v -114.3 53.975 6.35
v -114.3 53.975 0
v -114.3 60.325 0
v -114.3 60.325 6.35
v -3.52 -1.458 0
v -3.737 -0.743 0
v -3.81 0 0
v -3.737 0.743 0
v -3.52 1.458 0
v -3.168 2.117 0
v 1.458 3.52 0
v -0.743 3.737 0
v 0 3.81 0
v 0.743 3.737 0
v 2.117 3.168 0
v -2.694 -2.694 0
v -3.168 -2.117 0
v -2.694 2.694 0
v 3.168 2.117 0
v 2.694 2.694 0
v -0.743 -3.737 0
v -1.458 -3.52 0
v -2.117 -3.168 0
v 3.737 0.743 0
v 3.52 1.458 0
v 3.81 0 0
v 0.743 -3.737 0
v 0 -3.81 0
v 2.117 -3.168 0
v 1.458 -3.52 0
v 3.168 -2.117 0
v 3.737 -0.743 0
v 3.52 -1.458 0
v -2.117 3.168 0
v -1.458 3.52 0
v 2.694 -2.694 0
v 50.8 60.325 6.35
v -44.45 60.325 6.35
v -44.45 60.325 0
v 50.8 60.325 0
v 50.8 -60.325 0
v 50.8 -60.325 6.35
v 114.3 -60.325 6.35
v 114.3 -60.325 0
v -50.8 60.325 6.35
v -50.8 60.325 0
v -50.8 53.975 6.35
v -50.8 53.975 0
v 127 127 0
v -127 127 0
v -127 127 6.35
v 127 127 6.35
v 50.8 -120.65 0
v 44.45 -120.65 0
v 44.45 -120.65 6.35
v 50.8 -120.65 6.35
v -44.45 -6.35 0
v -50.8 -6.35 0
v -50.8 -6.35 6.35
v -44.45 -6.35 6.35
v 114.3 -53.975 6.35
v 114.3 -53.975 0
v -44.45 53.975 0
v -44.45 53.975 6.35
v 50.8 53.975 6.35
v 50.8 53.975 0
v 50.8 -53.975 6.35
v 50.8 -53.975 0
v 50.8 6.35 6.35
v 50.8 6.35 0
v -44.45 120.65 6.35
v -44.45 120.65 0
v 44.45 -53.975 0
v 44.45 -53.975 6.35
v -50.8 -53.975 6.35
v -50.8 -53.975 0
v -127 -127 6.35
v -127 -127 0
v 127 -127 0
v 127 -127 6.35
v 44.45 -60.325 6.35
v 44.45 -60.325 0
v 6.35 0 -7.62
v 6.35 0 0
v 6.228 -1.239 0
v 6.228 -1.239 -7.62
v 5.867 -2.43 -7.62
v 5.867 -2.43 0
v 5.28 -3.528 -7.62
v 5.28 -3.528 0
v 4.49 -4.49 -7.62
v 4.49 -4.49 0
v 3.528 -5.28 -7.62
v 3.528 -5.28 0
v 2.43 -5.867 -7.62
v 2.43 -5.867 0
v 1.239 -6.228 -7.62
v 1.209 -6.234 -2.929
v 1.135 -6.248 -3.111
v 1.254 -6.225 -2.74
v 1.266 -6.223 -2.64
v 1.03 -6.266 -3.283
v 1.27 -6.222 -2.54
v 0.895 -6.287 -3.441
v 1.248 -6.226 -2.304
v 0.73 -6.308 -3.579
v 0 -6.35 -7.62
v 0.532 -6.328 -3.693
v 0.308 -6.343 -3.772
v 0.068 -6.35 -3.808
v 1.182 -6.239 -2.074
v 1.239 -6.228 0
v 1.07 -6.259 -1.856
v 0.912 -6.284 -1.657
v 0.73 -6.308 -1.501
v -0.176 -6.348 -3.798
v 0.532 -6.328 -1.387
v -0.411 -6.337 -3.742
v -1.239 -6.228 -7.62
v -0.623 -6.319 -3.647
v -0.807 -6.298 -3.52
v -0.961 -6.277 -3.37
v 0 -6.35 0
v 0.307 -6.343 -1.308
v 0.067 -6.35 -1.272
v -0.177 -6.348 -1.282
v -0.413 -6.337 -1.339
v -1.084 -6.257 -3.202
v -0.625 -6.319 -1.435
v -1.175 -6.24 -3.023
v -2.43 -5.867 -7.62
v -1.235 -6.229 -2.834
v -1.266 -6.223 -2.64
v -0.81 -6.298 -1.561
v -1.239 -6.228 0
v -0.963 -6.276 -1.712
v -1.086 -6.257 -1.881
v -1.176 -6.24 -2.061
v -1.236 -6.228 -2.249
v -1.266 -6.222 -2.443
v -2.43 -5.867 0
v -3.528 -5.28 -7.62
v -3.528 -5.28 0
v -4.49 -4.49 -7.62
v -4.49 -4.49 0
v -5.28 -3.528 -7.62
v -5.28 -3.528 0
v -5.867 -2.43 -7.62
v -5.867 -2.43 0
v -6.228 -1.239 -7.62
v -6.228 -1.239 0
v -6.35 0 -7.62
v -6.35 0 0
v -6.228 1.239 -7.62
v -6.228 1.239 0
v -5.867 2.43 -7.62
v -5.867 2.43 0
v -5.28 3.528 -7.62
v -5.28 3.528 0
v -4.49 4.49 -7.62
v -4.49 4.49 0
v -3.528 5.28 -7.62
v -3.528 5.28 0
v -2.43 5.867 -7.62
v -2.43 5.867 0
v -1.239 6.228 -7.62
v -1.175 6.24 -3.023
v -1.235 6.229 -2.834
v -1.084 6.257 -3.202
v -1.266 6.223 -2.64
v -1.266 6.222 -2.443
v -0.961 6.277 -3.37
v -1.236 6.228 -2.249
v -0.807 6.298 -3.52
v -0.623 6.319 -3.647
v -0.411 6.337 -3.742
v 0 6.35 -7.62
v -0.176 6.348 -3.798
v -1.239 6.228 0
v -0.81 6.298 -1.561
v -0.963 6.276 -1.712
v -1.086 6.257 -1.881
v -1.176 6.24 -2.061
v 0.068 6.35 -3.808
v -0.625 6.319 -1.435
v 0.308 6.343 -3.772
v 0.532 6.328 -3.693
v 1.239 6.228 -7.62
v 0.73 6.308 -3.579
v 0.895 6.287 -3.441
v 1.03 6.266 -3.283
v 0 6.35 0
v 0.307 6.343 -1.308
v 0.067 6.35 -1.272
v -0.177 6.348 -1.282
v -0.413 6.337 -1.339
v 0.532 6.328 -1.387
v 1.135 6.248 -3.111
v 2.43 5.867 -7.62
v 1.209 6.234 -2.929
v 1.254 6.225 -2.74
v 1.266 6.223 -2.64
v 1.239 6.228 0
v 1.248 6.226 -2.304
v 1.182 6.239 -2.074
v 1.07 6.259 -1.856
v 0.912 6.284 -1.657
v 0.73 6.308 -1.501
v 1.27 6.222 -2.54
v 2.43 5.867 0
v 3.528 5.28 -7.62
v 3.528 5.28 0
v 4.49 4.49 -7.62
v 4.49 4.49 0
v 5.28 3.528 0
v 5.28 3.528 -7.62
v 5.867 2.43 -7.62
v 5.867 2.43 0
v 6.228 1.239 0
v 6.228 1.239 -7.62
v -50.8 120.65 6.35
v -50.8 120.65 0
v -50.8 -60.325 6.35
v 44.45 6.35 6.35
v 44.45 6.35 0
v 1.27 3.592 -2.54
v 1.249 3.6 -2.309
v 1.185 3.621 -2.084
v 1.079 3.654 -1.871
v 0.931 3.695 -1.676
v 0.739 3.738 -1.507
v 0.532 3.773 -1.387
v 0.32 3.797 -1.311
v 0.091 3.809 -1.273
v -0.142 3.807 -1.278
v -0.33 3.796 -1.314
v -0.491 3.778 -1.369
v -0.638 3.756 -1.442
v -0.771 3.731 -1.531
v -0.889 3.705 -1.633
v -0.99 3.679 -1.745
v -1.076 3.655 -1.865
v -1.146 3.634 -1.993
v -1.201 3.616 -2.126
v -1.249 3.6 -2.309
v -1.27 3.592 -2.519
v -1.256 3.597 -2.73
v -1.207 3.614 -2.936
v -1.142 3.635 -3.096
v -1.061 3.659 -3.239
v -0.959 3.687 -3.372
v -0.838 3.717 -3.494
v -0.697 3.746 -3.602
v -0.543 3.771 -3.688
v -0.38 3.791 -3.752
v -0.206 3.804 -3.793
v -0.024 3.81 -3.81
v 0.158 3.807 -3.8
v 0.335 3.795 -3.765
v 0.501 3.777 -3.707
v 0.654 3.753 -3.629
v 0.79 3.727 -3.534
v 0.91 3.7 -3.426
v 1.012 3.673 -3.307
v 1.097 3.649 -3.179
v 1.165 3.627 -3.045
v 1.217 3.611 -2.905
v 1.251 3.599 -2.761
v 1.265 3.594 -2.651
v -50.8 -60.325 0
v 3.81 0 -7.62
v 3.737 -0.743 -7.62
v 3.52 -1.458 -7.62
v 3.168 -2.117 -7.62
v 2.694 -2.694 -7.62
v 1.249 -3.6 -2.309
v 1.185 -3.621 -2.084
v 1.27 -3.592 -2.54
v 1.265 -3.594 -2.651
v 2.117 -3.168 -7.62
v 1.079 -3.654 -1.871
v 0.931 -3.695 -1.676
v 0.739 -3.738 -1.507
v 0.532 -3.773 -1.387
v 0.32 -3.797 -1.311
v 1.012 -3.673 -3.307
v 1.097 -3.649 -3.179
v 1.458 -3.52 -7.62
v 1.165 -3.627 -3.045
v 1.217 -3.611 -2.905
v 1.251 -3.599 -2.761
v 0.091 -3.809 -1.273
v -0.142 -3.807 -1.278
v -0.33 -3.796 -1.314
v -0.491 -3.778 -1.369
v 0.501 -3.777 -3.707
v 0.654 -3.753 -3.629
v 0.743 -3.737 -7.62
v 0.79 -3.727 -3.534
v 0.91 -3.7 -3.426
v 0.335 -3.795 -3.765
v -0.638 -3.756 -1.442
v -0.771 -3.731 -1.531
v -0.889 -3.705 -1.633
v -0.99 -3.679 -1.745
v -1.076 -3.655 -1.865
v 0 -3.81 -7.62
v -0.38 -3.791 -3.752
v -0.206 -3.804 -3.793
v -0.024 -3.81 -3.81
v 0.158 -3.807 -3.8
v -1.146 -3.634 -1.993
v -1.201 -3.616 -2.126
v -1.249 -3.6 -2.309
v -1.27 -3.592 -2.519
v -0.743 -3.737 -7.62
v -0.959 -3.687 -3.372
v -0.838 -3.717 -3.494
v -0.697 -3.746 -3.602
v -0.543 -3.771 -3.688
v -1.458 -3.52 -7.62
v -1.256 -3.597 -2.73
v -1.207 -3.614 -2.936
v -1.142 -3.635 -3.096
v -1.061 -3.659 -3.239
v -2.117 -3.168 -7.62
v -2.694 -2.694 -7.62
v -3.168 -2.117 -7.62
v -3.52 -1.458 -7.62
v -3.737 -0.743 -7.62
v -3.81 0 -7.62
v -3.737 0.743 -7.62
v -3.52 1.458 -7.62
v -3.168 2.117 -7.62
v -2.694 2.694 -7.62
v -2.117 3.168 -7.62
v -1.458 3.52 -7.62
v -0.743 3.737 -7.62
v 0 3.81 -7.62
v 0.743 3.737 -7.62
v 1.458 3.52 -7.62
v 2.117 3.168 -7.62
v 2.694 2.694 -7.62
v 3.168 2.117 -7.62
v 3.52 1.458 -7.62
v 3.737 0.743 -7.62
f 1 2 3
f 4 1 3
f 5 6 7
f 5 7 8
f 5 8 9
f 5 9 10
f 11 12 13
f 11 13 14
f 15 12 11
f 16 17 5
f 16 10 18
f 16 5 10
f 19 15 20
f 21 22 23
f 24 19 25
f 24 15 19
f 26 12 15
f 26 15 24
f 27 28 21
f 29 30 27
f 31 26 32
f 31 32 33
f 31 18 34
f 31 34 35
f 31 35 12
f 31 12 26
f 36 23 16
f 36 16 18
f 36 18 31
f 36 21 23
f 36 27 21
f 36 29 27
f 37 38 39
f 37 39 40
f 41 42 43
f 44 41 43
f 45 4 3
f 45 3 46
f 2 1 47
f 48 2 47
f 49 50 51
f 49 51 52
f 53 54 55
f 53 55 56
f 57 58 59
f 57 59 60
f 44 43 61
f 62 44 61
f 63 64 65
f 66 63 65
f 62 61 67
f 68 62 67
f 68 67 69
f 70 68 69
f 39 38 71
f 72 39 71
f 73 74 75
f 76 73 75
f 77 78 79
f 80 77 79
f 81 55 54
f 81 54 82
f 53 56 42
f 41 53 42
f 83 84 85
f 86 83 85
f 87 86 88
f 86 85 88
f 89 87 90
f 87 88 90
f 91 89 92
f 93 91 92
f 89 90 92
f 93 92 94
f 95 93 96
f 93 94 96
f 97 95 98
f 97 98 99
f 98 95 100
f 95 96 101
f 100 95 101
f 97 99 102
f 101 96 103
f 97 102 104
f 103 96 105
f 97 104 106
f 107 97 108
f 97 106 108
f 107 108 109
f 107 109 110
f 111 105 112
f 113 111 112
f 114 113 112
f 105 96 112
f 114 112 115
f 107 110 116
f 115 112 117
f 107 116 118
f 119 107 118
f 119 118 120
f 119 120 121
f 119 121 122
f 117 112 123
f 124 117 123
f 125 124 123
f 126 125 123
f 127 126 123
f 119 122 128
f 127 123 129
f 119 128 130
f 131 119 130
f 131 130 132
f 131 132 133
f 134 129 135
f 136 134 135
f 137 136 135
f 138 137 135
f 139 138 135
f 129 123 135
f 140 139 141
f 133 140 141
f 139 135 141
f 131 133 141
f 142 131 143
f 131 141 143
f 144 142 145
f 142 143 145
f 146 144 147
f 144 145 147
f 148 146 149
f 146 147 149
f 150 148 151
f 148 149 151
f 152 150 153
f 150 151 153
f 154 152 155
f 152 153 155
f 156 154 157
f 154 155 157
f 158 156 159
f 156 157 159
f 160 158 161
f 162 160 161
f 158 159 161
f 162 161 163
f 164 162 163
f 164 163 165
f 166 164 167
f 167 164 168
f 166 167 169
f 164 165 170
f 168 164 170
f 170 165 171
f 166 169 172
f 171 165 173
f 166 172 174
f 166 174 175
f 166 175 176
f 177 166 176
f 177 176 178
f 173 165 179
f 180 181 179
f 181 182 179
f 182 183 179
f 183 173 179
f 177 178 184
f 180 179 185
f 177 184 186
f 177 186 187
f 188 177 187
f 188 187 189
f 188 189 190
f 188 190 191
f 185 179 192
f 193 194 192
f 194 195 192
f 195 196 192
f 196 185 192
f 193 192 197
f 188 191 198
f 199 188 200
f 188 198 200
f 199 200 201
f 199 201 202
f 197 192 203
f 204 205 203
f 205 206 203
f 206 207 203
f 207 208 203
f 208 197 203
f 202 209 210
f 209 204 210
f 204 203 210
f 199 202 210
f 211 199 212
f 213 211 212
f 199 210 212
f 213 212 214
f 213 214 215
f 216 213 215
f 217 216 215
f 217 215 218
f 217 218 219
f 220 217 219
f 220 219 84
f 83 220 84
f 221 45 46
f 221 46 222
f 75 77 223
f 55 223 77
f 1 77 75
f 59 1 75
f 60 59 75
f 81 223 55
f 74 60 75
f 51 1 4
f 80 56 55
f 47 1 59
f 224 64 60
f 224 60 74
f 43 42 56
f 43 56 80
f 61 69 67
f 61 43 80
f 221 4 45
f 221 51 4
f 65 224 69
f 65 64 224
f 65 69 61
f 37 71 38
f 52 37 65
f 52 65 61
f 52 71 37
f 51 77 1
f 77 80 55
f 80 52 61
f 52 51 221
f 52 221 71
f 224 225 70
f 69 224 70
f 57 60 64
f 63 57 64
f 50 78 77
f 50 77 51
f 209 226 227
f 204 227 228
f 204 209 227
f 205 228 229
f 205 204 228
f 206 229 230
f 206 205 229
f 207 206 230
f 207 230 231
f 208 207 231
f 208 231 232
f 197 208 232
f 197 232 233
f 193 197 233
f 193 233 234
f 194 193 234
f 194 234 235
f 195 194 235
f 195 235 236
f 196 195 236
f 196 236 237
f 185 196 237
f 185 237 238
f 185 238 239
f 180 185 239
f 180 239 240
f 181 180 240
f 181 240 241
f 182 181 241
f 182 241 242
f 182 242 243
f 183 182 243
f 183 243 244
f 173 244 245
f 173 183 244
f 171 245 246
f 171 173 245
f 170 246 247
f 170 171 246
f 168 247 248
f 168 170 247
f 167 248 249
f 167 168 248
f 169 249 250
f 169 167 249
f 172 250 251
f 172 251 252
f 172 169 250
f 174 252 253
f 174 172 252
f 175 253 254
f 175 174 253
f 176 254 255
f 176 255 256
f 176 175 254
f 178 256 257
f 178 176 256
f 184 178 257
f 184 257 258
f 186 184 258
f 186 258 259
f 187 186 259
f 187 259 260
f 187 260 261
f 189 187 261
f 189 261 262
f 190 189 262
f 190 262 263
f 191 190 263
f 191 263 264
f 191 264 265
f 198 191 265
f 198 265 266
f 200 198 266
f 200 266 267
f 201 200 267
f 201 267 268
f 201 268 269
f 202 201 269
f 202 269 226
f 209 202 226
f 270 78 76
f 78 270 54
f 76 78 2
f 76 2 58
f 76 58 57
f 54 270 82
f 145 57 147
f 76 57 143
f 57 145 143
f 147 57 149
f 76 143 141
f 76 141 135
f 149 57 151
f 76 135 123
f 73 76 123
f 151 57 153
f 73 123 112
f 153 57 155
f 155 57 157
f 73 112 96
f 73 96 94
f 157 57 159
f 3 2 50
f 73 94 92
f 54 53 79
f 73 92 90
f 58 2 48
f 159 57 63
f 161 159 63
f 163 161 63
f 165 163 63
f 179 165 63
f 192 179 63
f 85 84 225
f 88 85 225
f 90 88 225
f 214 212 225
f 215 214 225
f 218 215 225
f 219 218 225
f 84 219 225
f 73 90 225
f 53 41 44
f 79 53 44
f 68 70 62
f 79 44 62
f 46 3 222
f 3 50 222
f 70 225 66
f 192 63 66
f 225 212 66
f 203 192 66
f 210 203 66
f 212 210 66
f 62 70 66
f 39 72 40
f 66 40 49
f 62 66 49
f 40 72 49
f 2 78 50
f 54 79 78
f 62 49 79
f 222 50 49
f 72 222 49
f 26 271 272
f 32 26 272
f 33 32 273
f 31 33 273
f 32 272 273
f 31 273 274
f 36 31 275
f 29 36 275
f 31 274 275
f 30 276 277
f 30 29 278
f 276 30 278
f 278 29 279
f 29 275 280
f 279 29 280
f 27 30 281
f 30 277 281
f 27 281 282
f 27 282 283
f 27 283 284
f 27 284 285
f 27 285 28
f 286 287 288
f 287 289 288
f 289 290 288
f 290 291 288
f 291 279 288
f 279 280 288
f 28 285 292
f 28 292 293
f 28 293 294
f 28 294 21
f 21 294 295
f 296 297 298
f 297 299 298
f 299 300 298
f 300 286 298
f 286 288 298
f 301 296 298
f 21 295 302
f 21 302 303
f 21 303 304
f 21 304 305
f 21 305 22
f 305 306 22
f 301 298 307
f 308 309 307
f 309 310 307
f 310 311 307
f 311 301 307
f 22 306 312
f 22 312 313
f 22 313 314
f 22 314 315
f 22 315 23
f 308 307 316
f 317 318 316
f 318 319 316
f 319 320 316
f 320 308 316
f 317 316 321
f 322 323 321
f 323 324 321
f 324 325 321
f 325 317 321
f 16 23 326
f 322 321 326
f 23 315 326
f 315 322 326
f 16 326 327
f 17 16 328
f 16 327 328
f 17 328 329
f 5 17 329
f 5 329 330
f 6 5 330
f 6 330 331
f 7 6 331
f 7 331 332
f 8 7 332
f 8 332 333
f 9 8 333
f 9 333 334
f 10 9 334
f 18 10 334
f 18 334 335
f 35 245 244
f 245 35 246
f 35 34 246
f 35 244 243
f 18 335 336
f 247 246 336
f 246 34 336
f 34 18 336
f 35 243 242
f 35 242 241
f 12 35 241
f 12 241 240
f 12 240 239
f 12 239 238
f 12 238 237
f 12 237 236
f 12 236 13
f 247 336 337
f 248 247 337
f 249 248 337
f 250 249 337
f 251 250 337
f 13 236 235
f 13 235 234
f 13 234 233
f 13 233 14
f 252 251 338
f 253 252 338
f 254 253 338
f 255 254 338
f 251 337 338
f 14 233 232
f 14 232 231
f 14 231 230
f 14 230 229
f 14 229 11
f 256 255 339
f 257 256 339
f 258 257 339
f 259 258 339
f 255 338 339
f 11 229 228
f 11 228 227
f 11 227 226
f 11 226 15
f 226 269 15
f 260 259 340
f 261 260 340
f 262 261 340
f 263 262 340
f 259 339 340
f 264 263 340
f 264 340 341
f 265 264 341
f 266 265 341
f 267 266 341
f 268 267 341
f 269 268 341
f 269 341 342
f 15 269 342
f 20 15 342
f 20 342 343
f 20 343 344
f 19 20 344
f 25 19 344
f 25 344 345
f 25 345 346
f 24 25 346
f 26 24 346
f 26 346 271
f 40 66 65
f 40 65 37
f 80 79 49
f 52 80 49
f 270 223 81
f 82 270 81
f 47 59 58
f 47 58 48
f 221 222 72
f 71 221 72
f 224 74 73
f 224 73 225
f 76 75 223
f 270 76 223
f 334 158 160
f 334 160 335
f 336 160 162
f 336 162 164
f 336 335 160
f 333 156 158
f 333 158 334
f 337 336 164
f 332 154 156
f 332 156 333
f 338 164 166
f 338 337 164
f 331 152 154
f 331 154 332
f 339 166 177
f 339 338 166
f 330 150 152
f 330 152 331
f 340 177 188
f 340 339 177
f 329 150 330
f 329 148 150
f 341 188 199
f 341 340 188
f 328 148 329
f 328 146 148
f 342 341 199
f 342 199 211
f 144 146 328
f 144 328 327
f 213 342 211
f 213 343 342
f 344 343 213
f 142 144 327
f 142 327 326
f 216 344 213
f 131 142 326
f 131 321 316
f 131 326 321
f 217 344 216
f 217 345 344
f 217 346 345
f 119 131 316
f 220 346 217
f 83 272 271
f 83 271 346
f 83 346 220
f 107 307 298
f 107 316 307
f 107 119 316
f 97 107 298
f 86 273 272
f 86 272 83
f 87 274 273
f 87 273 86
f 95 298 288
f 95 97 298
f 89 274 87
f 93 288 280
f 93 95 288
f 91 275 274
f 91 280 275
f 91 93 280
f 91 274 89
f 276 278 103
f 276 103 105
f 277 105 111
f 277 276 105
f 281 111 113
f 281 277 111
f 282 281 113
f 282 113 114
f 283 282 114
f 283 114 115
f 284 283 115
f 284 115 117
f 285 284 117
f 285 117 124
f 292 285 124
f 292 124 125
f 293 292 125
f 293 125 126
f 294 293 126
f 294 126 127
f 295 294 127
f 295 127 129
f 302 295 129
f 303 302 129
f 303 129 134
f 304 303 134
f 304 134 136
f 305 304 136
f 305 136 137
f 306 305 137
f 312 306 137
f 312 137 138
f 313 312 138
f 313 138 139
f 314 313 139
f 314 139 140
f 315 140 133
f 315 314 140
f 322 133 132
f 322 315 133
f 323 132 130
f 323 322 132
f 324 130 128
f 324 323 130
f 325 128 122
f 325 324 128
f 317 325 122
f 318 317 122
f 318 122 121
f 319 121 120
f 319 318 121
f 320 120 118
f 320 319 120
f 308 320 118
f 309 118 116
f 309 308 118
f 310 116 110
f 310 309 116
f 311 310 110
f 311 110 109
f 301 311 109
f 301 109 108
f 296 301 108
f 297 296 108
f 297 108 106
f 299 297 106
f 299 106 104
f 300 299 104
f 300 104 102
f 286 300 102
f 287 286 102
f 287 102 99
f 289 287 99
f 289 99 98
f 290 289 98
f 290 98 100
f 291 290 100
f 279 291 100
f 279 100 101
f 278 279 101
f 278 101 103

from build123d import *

# Parameters (mm, degrees)
F0_W      = 254
F0_H      = 254
F1_DEPTH  = 6.35
F4_DEPTH  = 25.4
F5_W      = 6.35
F5_H      = 127
F6_DEPTH  = 25.4
F7_W      = 165.1
F7_H      = 6.35
F8_DEPTH  = 25.4
F9_R      = 6.35
F10_DEPTH = 7.62
F11_R     = 3.81
F14_DEPTH = 7.62
F13_R     = 1.27
F15_DEPTH = 25.4
F2_W      = 6.35
F2_H      = 127
F16_DEPTH = 25.4


with BuildPart() as f1:
    # F0 (on Top) → F1 (new body)
    with BuildSketch(Plane.XY):
        Rectangle(F0_W, F0_H)
    extrude(amount=F1_DEPTH)

    # F3 (on face) → F4 (cut)
    with BuildSketch(Plane.XY.offset(6.35)):
        Polygon((114.3, -53.975), (-50.8, -53.975), (-50.8, -60.325), (114.3, -60.325), (114.3, -57.15), (114.3, -56.917642), align=None)
    extrude(amount=-F4_DEPTH, mode=Mode.SUBTRACT)

    # F5 (on face) → F6 (cut)
    with BuildSketch(Plane.XY.offset(6.35)):
        with Locations((47.625, -57.15)):
            Rectangle(F5_W, F5_H)
    extrude(amount=-F6_DEPTH, mode=Mode.SUBTRACT)

    # F7 (on face) → F8 (cut)
    with BuildSketch(Plane.XY.offset(6.35)):
        with Locations((-31.75, 57.15)):
            Rectangle(F7_W, F7_H)
    extrude(amount=-F8_DEPTH, mode=Mode.SUBTRACT)

    # F9 (on face) → F10 (join)
    with BuildSketch(Plane(origin=(0, 0, 0), x_dir=(1, 0, 0), z_dir=(0, 0, -1))):
        Circle(F9_R)
    extrude(amount=F10_DEPTH)

    # F11 (on face) → F14 (cut)
    with BuildSketch(Plane(origin=(0, 0, -7.62), x_dir=(1, 0, 0), z_dir=(0, 0, -1))):
        Circle(F11_R)
    extrude(amount=-F14_DEPTH, mode=Mode.SUBTRACT)

    # F13 (on offset) → F15 (cut)
    with BuildSketch(Plane.XZ.offset(-12.7)):
        with Locations((0, -2.54)):
            Circle(F13_R)
    extrude(amount=F15_DEPTH, mode=Mode.SUBTRACT)

    # F2 (on face) → F16 (cut)
    with BuildSketch(Plane.XY.offset(6.35)):
        with Locations((-47.625, 57.15)):
            Rectangle(F2_W, F2_H)
    extrude(amount=-F16_DEPTH, mode=Mode.SUBTRACT)


solid = f1.part
